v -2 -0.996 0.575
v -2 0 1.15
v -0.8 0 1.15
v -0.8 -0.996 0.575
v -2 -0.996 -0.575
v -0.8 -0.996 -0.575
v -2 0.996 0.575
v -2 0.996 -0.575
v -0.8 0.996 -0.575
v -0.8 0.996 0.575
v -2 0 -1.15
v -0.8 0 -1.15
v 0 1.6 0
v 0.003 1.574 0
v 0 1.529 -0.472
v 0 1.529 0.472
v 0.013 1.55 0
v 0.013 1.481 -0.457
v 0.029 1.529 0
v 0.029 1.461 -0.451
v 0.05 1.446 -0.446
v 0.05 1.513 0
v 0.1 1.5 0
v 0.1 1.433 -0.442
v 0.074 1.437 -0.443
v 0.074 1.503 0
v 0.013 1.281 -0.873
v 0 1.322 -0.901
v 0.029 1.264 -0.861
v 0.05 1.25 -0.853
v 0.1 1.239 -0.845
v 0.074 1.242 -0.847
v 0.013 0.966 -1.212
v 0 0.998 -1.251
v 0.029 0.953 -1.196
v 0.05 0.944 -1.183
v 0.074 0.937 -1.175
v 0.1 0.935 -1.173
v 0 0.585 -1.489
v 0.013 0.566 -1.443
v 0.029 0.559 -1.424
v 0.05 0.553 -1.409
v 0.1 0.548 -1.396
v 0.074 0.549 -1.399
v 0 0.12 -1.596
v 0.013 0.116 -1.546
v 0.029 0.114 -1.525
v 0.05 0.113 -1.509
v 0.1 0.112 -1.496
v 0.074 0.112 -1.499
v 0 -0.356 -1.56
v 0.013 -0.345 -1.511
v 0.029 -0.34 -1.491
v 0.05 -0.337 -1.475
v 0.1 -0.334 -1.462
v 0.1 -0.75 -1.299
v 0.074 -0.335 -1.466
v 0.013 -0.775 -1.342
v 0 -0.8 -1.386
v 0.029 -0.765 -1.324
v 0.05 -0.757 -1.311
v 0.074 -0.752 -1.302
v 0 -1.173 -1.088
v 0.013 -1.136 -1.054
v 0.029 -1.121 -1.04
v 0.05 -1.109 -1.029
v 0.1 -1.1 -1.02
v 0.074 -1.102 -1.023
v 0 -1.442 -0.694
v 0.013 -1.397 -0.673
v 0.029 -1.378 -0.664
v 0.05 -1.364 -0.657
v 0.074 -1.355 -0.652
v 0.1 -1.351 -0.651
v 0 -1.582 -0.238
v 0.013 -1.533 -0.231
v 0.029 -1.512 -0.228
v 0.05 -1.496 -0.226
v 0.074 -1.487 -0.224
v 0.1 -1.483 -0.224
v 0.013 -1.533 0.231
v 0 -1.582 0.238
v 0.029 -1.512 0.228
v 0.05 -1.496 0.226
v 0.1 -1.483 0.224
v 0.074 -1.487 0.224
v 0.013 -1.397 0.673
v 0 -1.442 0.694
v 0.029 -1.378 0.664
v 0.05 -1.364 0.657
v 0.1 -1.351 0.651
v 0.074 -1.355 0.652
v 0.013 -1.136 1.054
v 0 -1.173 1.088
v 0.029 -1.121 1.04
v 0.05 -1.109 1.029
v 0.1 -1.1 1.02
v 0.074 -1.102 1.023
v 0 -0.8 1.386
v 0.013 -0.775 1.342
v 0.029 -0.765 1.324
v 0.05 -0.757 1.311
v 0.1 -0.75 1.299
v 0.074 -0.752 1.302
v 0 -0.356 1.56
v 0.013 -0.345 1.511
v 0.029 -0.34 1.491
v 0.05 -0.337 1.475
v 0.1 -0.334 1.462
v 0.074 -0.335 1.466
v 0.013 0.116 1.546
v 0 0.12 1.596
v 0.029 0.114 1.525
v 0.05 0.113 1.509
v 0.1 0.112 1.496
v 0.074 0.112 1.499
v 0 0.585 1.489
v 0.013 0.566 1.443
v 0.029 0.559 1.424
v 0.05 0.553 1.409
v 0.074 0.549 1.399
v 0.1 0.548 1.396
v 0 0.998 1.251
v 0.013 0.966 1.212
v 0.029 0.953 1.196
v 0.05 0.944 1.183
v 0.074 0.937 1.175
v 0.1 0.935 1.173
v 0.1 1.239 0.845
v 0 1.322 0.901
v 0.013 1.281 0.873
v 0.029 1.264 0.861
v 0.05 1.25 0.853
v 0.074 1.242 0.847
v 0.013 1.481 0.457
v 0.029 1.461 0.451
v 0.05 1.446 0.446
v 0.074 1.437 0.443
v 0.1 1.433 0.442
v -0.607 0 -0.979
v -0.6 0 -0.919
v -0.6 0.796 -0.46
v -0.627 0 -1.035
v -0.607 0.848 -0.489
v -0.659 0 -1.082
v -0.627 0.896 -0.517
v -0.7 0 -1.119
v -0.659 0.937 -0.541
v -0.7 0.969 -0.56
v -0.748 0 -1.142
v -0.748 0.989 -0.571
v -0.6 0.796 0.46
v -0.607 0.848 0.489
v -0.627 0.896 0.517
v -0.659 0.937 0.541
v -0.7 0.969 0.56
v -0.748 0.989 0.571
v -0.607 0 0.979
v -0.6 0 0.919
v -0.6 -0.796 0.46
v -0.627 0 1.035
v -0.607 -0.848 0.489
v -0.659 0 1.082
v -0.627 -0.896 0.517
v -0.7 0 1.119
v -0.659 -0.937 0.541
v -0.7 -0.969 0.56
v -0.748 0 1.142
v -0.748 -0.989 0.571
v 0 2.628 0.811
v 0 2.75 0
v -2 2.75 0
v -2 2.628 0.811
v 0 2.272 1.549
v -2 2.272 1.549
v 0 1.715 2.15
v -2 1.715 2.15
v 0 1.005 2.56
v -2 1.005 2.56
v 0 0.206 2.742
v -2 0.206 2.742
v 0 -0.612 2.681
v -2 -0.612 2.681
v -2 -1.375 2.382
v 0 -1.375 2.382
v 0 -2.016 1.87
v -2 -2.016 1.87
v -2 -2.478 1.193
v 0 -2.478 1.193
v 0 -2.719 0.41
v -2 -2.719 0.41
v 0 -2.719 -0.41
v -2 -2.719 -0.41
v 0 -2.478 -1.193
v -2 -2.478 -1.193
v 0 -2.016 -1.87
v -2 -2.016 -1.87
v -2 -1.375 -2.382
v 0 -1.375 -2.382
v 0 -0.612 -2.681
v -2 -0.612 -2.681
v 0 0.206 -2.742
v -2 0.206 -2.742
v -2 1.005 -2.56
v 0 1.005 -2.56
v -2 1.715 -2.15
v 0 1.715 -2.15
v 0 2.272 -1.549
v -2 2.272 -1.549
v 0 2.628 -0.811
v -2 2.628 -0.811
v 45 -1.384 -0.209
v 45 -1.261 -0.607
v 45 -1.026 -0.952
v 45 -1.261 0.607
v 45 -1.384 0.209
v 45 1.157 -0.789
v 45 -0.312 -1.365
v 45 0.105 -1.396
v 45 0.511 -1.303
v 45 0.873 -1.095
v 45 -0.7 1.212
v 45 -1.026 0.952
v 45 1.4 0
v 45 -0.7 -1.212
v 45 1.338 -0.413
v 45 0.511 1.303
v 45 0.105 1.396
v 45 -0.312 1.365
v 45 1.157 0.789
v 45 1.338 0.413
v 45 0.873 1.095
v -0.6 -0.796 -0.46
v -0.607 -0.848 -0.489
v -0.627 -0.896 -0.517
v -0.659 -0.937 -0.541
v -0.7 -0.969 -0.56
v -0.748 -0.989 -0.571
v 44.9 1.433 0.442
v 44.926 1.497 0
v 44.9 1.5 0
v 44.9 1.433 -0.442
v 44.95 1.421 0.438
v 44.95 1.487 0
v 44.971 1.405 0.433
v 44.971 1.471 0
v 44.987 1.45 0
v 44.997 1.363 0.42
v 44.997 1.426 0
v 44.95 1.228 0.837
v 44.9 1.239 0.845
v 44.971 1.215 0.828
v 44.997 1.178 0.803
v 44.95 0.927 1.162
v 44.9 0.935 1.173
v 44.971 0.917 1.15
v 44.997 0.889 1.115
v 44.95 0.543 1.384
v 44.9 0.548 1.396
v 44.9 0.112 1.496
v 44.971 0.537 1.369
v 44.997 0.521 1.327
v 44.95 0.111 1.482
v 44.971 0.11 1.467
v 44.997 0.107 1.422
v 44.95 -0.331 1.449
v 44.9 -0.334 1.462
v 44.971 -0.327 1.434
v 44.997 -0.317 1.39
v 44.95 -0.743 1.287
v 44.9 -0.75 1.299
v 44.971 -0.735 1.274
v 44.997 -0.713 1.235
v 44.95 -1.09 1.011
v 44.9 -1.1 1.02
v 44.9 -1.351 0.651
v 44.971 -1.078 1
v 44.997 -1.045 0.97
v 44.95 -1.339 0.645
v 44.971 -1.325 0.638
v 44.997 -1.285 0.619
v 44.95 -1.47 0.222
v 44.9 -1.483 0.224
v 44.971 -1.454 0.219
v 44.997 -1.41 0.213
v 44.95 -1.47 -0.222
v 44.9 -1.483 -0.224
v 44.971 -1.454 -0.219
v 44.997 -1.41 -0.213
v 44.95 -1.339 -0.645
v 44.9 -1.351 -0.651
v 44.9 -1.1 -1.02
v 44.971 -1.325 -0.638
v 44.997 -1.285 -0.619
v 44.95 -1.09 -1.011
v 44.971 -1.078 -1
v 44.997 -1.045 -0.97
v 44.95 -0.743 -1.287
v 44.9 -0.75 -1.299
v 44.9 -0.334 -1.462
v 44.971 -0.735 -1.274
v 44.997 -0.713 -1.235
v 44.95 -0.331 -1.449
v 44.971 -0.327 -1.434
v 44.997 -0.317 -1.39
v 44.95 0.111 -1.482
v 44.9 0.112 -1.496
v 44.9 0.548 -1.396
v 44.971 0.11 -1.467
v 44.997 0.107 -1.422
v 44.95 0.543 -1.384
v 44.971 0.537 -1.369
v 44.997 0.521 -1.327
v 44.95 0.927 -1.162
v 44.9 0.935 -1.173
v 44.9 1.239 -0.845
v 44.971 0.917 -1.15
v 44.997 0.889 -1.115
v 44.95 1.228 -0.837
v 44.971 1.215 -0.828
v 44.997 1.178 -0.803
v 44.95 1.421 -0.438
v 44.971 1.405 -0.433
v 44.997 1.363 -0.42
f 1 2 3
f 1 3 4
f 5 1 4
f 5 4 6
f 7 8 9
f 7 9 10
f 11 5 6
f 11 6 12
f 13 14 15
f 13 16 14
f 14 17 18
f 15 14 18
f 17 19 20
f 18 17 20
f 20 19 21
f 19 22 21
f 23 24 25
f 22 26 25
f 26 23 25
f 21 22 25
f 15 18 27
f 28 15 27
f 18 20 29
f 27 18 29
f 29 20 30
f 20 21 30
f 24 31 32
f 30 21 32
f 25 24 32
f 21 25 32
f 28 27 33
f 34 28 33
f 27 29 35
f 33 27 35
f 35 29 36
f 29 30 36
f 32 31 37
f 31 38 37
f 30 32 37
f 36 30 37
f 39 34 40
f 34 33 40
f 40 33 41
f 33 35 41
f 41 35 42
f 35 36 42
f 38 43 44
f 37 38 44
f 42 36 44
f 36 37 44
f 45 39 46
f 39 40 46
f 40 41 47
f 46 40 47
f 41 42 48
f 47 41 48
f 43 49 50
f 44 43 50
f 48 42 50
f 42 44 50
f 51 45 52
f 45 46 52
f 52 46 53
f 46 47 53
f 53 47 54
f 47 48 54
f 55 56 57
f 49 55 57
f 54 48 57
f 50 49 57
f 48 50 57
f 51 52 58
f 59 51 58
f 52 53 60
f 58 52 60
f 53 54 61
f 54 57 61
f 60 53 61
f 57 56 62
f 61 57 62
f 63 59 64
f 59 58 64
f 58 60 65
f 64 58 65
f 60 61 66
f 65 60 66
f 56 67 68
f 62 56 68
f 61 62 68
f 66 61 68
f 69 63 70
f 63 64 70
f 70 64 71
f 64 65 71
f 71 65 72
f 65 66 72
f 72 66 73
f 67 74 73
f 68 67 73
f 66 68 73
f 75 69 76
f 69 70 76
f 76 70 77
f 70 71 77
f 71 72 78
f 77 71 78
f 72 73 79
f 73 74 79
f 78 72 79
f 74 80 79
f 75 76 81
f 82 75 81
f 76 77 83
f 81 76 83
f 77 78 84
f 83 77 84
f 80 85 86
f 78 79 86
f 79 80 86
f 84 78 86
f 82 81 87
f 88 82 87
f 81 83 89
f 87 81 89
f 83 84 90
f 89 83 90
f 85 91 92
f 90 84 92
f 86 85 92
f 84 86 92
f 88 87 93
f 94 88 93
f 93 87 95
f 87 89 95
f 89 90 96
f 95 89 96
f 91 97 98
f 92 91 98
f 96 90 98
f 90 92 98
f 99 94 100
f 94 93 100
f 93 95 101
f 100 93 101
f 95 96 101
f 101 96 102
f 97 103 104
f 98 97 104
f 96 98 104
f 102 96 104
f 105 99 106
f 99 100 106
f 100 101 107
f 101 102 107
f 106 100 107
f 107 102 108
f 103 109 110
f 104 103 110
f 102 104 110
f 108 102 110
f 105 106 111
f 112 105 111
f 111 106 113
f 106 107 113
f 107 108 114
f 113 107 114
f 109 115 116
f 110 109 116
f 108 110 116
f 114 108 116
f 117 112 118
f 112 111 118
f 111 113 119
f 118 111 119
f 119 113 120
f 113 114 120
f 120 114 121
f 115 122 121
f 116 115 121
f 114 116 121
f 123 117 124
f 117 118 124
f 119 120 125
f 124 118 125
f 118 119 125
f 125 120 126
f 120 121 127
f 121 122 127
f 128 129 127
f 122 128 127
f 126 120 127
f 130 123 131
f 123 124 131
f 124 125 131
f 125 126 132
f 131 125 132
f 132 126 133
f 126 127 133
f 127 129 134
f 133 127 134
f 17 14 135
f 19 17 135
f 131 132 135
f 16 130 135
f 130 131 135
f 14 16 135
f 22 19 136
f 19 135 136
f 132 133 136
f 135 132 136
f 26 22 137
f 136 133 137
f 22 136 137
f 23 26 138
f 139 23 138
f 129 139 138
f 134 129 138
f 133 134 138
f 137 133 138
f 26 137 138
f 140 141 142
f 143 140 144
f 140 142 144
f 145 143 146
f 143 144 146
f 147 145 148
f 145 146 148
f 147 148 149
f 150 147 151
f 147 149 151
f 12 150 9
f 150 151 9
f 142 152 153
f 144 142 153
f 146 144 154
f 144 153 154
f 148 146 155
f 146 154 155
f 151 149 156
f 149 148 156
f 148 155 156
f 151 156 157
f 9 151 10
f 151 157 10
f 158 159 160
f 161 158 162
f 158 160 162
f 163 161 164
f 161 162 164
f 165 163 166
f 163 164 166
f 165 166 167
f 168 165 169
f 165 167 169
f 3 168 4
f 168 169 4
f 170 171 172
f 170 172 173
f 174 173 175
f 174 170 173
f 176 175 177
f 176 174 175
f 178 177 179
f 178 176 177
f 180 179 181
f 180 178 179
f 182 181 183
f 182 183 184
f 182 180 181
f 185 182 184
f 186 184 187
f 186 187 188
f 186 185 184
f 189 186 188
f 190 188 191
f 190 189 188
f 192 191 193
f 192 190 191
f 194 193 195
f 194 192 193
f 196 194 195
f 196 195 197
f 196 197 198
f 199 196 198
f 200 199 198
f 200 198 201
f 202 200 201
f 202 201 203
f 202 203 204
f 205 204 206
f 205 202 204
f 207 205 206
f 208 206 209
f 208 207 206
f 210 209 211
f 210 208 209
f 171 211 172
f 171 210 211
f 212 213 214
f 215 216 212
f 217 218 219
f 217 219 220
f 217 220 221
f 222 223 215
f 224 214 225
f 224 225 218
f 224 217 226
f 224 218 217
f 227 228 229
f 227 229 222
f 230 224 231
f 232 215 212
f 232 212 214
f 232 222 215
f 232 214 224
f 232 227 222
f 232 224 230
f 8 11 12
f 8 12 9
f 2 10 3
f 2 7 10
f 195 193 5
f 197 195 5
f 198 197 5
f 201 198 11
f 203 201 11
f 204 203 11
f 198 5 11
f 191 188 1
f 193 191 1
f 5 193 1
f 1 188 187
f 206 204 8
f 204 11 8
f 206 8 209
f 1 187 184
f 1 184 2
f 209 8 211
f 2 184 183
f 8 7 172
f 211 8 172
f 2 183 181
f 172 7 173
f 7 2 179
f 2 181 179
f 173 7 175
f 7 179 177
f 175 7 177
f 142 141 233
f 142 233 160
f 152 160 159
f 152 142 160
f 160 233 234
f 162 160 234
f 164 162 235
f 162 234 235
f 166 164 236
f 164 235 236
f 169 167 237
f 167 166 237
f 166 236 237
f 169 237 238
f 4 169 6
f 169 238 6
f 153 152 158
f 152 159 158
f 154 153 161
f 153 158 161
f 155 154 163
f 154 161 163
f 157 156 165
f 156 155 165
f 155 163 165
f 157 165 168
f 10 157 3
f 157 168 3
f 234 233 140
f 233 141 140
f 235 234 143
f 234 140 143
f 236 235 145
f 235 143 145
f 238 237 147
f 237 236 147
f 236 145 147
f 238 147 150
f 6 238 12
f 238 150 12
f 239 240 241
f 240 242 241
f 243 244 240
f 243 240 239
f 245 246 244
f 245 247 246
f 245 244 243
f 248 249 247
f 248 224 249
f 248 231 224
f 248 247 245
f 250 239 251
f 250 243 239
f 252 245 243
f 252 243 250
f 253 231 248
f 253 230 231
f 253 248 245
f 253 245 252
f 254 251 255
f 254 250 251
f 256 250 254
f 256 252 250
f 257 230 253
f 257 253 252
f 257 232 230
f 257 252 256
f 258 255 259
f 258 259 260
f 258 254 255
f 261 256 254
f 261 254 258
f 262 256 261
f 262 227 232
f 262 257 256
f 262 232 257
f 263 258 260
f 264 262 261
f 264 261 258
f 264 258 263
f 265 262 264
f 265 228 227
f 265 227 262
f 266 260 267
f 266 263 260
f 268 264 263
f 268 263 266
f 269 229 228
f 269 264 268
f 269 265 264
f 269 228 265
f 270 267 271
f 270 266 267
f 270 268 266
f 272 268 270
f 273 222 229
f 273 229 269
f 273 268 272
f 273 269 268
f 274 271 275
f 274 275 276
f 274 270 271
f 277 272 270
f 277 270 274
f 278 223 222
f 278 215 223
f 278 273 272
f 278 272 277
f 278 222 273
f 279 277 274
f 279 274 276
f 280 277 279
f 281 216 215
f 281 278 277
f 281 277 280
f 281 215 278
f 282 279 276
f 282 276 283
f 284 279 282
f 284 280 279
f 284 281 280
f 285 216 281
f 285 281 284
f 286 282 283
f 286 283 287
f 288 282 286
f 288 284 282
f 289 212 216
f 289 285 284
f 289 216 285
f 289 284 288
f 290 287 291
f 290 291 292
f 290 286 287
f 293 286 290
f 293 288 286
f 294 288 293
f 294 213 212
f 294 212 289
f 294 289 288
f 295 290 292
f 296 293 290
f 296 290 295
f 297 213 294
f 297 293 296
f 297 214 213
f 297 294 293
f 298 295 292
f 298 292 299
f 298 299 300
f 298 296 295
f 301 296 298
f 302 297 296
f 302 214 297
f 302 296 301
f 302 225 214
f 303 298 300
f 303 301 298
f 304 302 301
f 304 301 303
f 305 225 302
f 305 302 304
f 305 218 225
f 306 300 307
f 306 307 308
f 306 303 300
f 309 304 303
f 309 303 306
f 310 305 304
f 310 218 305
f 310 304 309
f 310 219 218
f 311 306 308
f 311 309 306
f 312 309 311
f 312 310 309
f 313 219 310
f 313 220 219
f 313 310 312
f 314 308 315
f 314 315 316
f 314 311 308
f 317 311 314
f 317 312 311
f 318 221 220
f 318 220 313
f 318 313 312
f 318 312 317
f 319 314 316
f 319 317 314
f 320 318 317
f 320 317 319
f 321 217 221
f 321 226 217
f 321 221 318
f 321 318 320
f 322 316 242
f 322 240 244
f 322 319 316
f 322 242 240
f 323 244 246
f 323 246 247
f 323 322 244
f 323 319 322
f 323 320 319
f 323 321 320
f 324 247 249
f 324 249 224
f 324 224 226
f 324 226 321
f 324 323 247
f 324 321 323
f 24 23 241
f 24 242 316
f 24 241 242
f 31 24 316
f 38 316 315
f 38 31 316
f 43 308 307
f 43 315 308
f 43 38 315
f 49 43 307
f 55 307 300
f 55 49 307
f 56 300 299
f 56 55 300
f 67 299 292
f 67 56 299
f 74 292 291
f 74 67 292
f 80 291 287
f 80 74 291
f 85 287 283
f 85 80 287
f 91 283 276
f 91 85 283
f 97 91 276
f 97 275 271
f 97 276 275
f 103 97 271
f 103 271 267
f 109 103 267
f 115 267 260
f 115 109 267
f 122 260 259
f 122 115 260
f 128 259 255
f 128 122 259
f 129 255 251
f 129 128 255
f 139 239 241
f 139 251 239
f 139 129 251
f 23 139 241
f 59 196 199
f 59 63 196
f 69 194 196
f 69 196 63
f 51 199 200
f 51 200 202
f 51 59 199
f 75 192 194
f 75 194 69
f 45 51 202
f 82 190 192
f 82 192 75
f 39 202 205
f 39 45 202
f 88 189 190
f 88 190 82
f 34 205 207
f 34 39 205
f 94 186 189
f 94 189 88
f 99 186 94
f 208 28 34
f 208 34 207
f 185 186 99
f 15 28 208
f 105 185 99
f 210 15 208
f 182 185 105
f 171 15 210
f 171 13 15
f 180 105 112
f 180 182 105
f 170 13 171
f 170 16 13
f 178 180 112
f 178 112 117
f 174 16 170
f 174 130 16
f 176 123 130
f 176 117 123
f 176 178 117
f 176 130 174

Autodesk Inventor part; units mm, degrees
ref_plane "YZ Plane" through (0, 0, 0) normal (1, 0, 0) x (0, 1, 0)
ref_plane "XZ Plane" through (0, 0, 0) normal (0, 1, 0) x (-1, 0, 0)
ref_plane "XY Plane" through (0, 0, 0) normal (0, 0, 1) x (1, 0, 0)
sketch "スケッチ1" plane through (0, 0, 0) normal (0, 0, 1) x (1, 0, 0)
  line L0 (0, 0) -> (45, 0)
  line L1 (45, 0) -> (45, 1.5)
  line L2 (45, 1.5) -> (0, 1.5)
  line L3 (0, 1.5) -> (0, 0)
  line L4 (0, 0) -> (0, 2.75)
  line L5 (0, 0) -> (-2, 0)
  line L6 (-2, 0) -> (0, 0)
  line L7 (-2, 0) -> (-2, 1.15)
  line L8 (0, 0) -> (-2, 0)
  line L9 (-2, 0) -> (-2, 2.75)
  line L10 (-2, 2.75) -> (0, 2.75)
  line L11 (0, 2.75) -> (0, 0)
  dimension "d0" = 1.5
  dimension "d1" = 45
  dimension "d3" = 2
  dimension "d4" = 2.75
  dimension "d5" = 1.15
revolve "回転1" add sketch "スケッチ1" angle 360 about axis through (-2, 0, 0) along (1, 0, 0)
sketch "スケッチ2" plane through (-2, 0, 0) normal (-1, 0, 0) x (0, 0, 1)
  line L0 (-0.575, 0.9959) -> (0.575, 0.9959)
  line L1 (0.575, 0.9959) -> (1.15, 0)
  line L2 (1.15, 0) -> (0.575, -0.9959)
  line L3 (0.575, -0.9959) -> (-0.575, -0.9959)
  line L4 (-0.575, -0.9959) -> (-1.15, 0)
  line L5 (-1.15, 0) -> (-0.575, 0.9959)
  point P0 (0, 0)
  point P1 (0, 0)
  point P2 (0, 0)
  dimension "d10" = 1.15
  dimension "d11" = 1.9919
extrude "押し出し1" cut sketch "スケッチ2" against normal blind 1.4
fillet "フィレット1" radius 0.2 6 edges at (-0.6, 0.9959, 0) (-0.6, 0.498, 0.8625) (-0.6, 0.498, -0.8625) (-0.6, -0.498, -0.8625) (-0.6, -0.9959, 0) (-0.6, -0.498, 0.8625)
fillet "フィレット2" radius 0.1 1 edges at (0, -1.5, 0)
fillet "フィレット3" radius 0.1 1 edges at (45, -1.5, 0)
thread "ねじ2" size "M3x0.5" class "6g" standard "ANSI Metric M Profile" length 44.8 offset 27
properties part number "ネジキャップM3L45" material "鋼"
